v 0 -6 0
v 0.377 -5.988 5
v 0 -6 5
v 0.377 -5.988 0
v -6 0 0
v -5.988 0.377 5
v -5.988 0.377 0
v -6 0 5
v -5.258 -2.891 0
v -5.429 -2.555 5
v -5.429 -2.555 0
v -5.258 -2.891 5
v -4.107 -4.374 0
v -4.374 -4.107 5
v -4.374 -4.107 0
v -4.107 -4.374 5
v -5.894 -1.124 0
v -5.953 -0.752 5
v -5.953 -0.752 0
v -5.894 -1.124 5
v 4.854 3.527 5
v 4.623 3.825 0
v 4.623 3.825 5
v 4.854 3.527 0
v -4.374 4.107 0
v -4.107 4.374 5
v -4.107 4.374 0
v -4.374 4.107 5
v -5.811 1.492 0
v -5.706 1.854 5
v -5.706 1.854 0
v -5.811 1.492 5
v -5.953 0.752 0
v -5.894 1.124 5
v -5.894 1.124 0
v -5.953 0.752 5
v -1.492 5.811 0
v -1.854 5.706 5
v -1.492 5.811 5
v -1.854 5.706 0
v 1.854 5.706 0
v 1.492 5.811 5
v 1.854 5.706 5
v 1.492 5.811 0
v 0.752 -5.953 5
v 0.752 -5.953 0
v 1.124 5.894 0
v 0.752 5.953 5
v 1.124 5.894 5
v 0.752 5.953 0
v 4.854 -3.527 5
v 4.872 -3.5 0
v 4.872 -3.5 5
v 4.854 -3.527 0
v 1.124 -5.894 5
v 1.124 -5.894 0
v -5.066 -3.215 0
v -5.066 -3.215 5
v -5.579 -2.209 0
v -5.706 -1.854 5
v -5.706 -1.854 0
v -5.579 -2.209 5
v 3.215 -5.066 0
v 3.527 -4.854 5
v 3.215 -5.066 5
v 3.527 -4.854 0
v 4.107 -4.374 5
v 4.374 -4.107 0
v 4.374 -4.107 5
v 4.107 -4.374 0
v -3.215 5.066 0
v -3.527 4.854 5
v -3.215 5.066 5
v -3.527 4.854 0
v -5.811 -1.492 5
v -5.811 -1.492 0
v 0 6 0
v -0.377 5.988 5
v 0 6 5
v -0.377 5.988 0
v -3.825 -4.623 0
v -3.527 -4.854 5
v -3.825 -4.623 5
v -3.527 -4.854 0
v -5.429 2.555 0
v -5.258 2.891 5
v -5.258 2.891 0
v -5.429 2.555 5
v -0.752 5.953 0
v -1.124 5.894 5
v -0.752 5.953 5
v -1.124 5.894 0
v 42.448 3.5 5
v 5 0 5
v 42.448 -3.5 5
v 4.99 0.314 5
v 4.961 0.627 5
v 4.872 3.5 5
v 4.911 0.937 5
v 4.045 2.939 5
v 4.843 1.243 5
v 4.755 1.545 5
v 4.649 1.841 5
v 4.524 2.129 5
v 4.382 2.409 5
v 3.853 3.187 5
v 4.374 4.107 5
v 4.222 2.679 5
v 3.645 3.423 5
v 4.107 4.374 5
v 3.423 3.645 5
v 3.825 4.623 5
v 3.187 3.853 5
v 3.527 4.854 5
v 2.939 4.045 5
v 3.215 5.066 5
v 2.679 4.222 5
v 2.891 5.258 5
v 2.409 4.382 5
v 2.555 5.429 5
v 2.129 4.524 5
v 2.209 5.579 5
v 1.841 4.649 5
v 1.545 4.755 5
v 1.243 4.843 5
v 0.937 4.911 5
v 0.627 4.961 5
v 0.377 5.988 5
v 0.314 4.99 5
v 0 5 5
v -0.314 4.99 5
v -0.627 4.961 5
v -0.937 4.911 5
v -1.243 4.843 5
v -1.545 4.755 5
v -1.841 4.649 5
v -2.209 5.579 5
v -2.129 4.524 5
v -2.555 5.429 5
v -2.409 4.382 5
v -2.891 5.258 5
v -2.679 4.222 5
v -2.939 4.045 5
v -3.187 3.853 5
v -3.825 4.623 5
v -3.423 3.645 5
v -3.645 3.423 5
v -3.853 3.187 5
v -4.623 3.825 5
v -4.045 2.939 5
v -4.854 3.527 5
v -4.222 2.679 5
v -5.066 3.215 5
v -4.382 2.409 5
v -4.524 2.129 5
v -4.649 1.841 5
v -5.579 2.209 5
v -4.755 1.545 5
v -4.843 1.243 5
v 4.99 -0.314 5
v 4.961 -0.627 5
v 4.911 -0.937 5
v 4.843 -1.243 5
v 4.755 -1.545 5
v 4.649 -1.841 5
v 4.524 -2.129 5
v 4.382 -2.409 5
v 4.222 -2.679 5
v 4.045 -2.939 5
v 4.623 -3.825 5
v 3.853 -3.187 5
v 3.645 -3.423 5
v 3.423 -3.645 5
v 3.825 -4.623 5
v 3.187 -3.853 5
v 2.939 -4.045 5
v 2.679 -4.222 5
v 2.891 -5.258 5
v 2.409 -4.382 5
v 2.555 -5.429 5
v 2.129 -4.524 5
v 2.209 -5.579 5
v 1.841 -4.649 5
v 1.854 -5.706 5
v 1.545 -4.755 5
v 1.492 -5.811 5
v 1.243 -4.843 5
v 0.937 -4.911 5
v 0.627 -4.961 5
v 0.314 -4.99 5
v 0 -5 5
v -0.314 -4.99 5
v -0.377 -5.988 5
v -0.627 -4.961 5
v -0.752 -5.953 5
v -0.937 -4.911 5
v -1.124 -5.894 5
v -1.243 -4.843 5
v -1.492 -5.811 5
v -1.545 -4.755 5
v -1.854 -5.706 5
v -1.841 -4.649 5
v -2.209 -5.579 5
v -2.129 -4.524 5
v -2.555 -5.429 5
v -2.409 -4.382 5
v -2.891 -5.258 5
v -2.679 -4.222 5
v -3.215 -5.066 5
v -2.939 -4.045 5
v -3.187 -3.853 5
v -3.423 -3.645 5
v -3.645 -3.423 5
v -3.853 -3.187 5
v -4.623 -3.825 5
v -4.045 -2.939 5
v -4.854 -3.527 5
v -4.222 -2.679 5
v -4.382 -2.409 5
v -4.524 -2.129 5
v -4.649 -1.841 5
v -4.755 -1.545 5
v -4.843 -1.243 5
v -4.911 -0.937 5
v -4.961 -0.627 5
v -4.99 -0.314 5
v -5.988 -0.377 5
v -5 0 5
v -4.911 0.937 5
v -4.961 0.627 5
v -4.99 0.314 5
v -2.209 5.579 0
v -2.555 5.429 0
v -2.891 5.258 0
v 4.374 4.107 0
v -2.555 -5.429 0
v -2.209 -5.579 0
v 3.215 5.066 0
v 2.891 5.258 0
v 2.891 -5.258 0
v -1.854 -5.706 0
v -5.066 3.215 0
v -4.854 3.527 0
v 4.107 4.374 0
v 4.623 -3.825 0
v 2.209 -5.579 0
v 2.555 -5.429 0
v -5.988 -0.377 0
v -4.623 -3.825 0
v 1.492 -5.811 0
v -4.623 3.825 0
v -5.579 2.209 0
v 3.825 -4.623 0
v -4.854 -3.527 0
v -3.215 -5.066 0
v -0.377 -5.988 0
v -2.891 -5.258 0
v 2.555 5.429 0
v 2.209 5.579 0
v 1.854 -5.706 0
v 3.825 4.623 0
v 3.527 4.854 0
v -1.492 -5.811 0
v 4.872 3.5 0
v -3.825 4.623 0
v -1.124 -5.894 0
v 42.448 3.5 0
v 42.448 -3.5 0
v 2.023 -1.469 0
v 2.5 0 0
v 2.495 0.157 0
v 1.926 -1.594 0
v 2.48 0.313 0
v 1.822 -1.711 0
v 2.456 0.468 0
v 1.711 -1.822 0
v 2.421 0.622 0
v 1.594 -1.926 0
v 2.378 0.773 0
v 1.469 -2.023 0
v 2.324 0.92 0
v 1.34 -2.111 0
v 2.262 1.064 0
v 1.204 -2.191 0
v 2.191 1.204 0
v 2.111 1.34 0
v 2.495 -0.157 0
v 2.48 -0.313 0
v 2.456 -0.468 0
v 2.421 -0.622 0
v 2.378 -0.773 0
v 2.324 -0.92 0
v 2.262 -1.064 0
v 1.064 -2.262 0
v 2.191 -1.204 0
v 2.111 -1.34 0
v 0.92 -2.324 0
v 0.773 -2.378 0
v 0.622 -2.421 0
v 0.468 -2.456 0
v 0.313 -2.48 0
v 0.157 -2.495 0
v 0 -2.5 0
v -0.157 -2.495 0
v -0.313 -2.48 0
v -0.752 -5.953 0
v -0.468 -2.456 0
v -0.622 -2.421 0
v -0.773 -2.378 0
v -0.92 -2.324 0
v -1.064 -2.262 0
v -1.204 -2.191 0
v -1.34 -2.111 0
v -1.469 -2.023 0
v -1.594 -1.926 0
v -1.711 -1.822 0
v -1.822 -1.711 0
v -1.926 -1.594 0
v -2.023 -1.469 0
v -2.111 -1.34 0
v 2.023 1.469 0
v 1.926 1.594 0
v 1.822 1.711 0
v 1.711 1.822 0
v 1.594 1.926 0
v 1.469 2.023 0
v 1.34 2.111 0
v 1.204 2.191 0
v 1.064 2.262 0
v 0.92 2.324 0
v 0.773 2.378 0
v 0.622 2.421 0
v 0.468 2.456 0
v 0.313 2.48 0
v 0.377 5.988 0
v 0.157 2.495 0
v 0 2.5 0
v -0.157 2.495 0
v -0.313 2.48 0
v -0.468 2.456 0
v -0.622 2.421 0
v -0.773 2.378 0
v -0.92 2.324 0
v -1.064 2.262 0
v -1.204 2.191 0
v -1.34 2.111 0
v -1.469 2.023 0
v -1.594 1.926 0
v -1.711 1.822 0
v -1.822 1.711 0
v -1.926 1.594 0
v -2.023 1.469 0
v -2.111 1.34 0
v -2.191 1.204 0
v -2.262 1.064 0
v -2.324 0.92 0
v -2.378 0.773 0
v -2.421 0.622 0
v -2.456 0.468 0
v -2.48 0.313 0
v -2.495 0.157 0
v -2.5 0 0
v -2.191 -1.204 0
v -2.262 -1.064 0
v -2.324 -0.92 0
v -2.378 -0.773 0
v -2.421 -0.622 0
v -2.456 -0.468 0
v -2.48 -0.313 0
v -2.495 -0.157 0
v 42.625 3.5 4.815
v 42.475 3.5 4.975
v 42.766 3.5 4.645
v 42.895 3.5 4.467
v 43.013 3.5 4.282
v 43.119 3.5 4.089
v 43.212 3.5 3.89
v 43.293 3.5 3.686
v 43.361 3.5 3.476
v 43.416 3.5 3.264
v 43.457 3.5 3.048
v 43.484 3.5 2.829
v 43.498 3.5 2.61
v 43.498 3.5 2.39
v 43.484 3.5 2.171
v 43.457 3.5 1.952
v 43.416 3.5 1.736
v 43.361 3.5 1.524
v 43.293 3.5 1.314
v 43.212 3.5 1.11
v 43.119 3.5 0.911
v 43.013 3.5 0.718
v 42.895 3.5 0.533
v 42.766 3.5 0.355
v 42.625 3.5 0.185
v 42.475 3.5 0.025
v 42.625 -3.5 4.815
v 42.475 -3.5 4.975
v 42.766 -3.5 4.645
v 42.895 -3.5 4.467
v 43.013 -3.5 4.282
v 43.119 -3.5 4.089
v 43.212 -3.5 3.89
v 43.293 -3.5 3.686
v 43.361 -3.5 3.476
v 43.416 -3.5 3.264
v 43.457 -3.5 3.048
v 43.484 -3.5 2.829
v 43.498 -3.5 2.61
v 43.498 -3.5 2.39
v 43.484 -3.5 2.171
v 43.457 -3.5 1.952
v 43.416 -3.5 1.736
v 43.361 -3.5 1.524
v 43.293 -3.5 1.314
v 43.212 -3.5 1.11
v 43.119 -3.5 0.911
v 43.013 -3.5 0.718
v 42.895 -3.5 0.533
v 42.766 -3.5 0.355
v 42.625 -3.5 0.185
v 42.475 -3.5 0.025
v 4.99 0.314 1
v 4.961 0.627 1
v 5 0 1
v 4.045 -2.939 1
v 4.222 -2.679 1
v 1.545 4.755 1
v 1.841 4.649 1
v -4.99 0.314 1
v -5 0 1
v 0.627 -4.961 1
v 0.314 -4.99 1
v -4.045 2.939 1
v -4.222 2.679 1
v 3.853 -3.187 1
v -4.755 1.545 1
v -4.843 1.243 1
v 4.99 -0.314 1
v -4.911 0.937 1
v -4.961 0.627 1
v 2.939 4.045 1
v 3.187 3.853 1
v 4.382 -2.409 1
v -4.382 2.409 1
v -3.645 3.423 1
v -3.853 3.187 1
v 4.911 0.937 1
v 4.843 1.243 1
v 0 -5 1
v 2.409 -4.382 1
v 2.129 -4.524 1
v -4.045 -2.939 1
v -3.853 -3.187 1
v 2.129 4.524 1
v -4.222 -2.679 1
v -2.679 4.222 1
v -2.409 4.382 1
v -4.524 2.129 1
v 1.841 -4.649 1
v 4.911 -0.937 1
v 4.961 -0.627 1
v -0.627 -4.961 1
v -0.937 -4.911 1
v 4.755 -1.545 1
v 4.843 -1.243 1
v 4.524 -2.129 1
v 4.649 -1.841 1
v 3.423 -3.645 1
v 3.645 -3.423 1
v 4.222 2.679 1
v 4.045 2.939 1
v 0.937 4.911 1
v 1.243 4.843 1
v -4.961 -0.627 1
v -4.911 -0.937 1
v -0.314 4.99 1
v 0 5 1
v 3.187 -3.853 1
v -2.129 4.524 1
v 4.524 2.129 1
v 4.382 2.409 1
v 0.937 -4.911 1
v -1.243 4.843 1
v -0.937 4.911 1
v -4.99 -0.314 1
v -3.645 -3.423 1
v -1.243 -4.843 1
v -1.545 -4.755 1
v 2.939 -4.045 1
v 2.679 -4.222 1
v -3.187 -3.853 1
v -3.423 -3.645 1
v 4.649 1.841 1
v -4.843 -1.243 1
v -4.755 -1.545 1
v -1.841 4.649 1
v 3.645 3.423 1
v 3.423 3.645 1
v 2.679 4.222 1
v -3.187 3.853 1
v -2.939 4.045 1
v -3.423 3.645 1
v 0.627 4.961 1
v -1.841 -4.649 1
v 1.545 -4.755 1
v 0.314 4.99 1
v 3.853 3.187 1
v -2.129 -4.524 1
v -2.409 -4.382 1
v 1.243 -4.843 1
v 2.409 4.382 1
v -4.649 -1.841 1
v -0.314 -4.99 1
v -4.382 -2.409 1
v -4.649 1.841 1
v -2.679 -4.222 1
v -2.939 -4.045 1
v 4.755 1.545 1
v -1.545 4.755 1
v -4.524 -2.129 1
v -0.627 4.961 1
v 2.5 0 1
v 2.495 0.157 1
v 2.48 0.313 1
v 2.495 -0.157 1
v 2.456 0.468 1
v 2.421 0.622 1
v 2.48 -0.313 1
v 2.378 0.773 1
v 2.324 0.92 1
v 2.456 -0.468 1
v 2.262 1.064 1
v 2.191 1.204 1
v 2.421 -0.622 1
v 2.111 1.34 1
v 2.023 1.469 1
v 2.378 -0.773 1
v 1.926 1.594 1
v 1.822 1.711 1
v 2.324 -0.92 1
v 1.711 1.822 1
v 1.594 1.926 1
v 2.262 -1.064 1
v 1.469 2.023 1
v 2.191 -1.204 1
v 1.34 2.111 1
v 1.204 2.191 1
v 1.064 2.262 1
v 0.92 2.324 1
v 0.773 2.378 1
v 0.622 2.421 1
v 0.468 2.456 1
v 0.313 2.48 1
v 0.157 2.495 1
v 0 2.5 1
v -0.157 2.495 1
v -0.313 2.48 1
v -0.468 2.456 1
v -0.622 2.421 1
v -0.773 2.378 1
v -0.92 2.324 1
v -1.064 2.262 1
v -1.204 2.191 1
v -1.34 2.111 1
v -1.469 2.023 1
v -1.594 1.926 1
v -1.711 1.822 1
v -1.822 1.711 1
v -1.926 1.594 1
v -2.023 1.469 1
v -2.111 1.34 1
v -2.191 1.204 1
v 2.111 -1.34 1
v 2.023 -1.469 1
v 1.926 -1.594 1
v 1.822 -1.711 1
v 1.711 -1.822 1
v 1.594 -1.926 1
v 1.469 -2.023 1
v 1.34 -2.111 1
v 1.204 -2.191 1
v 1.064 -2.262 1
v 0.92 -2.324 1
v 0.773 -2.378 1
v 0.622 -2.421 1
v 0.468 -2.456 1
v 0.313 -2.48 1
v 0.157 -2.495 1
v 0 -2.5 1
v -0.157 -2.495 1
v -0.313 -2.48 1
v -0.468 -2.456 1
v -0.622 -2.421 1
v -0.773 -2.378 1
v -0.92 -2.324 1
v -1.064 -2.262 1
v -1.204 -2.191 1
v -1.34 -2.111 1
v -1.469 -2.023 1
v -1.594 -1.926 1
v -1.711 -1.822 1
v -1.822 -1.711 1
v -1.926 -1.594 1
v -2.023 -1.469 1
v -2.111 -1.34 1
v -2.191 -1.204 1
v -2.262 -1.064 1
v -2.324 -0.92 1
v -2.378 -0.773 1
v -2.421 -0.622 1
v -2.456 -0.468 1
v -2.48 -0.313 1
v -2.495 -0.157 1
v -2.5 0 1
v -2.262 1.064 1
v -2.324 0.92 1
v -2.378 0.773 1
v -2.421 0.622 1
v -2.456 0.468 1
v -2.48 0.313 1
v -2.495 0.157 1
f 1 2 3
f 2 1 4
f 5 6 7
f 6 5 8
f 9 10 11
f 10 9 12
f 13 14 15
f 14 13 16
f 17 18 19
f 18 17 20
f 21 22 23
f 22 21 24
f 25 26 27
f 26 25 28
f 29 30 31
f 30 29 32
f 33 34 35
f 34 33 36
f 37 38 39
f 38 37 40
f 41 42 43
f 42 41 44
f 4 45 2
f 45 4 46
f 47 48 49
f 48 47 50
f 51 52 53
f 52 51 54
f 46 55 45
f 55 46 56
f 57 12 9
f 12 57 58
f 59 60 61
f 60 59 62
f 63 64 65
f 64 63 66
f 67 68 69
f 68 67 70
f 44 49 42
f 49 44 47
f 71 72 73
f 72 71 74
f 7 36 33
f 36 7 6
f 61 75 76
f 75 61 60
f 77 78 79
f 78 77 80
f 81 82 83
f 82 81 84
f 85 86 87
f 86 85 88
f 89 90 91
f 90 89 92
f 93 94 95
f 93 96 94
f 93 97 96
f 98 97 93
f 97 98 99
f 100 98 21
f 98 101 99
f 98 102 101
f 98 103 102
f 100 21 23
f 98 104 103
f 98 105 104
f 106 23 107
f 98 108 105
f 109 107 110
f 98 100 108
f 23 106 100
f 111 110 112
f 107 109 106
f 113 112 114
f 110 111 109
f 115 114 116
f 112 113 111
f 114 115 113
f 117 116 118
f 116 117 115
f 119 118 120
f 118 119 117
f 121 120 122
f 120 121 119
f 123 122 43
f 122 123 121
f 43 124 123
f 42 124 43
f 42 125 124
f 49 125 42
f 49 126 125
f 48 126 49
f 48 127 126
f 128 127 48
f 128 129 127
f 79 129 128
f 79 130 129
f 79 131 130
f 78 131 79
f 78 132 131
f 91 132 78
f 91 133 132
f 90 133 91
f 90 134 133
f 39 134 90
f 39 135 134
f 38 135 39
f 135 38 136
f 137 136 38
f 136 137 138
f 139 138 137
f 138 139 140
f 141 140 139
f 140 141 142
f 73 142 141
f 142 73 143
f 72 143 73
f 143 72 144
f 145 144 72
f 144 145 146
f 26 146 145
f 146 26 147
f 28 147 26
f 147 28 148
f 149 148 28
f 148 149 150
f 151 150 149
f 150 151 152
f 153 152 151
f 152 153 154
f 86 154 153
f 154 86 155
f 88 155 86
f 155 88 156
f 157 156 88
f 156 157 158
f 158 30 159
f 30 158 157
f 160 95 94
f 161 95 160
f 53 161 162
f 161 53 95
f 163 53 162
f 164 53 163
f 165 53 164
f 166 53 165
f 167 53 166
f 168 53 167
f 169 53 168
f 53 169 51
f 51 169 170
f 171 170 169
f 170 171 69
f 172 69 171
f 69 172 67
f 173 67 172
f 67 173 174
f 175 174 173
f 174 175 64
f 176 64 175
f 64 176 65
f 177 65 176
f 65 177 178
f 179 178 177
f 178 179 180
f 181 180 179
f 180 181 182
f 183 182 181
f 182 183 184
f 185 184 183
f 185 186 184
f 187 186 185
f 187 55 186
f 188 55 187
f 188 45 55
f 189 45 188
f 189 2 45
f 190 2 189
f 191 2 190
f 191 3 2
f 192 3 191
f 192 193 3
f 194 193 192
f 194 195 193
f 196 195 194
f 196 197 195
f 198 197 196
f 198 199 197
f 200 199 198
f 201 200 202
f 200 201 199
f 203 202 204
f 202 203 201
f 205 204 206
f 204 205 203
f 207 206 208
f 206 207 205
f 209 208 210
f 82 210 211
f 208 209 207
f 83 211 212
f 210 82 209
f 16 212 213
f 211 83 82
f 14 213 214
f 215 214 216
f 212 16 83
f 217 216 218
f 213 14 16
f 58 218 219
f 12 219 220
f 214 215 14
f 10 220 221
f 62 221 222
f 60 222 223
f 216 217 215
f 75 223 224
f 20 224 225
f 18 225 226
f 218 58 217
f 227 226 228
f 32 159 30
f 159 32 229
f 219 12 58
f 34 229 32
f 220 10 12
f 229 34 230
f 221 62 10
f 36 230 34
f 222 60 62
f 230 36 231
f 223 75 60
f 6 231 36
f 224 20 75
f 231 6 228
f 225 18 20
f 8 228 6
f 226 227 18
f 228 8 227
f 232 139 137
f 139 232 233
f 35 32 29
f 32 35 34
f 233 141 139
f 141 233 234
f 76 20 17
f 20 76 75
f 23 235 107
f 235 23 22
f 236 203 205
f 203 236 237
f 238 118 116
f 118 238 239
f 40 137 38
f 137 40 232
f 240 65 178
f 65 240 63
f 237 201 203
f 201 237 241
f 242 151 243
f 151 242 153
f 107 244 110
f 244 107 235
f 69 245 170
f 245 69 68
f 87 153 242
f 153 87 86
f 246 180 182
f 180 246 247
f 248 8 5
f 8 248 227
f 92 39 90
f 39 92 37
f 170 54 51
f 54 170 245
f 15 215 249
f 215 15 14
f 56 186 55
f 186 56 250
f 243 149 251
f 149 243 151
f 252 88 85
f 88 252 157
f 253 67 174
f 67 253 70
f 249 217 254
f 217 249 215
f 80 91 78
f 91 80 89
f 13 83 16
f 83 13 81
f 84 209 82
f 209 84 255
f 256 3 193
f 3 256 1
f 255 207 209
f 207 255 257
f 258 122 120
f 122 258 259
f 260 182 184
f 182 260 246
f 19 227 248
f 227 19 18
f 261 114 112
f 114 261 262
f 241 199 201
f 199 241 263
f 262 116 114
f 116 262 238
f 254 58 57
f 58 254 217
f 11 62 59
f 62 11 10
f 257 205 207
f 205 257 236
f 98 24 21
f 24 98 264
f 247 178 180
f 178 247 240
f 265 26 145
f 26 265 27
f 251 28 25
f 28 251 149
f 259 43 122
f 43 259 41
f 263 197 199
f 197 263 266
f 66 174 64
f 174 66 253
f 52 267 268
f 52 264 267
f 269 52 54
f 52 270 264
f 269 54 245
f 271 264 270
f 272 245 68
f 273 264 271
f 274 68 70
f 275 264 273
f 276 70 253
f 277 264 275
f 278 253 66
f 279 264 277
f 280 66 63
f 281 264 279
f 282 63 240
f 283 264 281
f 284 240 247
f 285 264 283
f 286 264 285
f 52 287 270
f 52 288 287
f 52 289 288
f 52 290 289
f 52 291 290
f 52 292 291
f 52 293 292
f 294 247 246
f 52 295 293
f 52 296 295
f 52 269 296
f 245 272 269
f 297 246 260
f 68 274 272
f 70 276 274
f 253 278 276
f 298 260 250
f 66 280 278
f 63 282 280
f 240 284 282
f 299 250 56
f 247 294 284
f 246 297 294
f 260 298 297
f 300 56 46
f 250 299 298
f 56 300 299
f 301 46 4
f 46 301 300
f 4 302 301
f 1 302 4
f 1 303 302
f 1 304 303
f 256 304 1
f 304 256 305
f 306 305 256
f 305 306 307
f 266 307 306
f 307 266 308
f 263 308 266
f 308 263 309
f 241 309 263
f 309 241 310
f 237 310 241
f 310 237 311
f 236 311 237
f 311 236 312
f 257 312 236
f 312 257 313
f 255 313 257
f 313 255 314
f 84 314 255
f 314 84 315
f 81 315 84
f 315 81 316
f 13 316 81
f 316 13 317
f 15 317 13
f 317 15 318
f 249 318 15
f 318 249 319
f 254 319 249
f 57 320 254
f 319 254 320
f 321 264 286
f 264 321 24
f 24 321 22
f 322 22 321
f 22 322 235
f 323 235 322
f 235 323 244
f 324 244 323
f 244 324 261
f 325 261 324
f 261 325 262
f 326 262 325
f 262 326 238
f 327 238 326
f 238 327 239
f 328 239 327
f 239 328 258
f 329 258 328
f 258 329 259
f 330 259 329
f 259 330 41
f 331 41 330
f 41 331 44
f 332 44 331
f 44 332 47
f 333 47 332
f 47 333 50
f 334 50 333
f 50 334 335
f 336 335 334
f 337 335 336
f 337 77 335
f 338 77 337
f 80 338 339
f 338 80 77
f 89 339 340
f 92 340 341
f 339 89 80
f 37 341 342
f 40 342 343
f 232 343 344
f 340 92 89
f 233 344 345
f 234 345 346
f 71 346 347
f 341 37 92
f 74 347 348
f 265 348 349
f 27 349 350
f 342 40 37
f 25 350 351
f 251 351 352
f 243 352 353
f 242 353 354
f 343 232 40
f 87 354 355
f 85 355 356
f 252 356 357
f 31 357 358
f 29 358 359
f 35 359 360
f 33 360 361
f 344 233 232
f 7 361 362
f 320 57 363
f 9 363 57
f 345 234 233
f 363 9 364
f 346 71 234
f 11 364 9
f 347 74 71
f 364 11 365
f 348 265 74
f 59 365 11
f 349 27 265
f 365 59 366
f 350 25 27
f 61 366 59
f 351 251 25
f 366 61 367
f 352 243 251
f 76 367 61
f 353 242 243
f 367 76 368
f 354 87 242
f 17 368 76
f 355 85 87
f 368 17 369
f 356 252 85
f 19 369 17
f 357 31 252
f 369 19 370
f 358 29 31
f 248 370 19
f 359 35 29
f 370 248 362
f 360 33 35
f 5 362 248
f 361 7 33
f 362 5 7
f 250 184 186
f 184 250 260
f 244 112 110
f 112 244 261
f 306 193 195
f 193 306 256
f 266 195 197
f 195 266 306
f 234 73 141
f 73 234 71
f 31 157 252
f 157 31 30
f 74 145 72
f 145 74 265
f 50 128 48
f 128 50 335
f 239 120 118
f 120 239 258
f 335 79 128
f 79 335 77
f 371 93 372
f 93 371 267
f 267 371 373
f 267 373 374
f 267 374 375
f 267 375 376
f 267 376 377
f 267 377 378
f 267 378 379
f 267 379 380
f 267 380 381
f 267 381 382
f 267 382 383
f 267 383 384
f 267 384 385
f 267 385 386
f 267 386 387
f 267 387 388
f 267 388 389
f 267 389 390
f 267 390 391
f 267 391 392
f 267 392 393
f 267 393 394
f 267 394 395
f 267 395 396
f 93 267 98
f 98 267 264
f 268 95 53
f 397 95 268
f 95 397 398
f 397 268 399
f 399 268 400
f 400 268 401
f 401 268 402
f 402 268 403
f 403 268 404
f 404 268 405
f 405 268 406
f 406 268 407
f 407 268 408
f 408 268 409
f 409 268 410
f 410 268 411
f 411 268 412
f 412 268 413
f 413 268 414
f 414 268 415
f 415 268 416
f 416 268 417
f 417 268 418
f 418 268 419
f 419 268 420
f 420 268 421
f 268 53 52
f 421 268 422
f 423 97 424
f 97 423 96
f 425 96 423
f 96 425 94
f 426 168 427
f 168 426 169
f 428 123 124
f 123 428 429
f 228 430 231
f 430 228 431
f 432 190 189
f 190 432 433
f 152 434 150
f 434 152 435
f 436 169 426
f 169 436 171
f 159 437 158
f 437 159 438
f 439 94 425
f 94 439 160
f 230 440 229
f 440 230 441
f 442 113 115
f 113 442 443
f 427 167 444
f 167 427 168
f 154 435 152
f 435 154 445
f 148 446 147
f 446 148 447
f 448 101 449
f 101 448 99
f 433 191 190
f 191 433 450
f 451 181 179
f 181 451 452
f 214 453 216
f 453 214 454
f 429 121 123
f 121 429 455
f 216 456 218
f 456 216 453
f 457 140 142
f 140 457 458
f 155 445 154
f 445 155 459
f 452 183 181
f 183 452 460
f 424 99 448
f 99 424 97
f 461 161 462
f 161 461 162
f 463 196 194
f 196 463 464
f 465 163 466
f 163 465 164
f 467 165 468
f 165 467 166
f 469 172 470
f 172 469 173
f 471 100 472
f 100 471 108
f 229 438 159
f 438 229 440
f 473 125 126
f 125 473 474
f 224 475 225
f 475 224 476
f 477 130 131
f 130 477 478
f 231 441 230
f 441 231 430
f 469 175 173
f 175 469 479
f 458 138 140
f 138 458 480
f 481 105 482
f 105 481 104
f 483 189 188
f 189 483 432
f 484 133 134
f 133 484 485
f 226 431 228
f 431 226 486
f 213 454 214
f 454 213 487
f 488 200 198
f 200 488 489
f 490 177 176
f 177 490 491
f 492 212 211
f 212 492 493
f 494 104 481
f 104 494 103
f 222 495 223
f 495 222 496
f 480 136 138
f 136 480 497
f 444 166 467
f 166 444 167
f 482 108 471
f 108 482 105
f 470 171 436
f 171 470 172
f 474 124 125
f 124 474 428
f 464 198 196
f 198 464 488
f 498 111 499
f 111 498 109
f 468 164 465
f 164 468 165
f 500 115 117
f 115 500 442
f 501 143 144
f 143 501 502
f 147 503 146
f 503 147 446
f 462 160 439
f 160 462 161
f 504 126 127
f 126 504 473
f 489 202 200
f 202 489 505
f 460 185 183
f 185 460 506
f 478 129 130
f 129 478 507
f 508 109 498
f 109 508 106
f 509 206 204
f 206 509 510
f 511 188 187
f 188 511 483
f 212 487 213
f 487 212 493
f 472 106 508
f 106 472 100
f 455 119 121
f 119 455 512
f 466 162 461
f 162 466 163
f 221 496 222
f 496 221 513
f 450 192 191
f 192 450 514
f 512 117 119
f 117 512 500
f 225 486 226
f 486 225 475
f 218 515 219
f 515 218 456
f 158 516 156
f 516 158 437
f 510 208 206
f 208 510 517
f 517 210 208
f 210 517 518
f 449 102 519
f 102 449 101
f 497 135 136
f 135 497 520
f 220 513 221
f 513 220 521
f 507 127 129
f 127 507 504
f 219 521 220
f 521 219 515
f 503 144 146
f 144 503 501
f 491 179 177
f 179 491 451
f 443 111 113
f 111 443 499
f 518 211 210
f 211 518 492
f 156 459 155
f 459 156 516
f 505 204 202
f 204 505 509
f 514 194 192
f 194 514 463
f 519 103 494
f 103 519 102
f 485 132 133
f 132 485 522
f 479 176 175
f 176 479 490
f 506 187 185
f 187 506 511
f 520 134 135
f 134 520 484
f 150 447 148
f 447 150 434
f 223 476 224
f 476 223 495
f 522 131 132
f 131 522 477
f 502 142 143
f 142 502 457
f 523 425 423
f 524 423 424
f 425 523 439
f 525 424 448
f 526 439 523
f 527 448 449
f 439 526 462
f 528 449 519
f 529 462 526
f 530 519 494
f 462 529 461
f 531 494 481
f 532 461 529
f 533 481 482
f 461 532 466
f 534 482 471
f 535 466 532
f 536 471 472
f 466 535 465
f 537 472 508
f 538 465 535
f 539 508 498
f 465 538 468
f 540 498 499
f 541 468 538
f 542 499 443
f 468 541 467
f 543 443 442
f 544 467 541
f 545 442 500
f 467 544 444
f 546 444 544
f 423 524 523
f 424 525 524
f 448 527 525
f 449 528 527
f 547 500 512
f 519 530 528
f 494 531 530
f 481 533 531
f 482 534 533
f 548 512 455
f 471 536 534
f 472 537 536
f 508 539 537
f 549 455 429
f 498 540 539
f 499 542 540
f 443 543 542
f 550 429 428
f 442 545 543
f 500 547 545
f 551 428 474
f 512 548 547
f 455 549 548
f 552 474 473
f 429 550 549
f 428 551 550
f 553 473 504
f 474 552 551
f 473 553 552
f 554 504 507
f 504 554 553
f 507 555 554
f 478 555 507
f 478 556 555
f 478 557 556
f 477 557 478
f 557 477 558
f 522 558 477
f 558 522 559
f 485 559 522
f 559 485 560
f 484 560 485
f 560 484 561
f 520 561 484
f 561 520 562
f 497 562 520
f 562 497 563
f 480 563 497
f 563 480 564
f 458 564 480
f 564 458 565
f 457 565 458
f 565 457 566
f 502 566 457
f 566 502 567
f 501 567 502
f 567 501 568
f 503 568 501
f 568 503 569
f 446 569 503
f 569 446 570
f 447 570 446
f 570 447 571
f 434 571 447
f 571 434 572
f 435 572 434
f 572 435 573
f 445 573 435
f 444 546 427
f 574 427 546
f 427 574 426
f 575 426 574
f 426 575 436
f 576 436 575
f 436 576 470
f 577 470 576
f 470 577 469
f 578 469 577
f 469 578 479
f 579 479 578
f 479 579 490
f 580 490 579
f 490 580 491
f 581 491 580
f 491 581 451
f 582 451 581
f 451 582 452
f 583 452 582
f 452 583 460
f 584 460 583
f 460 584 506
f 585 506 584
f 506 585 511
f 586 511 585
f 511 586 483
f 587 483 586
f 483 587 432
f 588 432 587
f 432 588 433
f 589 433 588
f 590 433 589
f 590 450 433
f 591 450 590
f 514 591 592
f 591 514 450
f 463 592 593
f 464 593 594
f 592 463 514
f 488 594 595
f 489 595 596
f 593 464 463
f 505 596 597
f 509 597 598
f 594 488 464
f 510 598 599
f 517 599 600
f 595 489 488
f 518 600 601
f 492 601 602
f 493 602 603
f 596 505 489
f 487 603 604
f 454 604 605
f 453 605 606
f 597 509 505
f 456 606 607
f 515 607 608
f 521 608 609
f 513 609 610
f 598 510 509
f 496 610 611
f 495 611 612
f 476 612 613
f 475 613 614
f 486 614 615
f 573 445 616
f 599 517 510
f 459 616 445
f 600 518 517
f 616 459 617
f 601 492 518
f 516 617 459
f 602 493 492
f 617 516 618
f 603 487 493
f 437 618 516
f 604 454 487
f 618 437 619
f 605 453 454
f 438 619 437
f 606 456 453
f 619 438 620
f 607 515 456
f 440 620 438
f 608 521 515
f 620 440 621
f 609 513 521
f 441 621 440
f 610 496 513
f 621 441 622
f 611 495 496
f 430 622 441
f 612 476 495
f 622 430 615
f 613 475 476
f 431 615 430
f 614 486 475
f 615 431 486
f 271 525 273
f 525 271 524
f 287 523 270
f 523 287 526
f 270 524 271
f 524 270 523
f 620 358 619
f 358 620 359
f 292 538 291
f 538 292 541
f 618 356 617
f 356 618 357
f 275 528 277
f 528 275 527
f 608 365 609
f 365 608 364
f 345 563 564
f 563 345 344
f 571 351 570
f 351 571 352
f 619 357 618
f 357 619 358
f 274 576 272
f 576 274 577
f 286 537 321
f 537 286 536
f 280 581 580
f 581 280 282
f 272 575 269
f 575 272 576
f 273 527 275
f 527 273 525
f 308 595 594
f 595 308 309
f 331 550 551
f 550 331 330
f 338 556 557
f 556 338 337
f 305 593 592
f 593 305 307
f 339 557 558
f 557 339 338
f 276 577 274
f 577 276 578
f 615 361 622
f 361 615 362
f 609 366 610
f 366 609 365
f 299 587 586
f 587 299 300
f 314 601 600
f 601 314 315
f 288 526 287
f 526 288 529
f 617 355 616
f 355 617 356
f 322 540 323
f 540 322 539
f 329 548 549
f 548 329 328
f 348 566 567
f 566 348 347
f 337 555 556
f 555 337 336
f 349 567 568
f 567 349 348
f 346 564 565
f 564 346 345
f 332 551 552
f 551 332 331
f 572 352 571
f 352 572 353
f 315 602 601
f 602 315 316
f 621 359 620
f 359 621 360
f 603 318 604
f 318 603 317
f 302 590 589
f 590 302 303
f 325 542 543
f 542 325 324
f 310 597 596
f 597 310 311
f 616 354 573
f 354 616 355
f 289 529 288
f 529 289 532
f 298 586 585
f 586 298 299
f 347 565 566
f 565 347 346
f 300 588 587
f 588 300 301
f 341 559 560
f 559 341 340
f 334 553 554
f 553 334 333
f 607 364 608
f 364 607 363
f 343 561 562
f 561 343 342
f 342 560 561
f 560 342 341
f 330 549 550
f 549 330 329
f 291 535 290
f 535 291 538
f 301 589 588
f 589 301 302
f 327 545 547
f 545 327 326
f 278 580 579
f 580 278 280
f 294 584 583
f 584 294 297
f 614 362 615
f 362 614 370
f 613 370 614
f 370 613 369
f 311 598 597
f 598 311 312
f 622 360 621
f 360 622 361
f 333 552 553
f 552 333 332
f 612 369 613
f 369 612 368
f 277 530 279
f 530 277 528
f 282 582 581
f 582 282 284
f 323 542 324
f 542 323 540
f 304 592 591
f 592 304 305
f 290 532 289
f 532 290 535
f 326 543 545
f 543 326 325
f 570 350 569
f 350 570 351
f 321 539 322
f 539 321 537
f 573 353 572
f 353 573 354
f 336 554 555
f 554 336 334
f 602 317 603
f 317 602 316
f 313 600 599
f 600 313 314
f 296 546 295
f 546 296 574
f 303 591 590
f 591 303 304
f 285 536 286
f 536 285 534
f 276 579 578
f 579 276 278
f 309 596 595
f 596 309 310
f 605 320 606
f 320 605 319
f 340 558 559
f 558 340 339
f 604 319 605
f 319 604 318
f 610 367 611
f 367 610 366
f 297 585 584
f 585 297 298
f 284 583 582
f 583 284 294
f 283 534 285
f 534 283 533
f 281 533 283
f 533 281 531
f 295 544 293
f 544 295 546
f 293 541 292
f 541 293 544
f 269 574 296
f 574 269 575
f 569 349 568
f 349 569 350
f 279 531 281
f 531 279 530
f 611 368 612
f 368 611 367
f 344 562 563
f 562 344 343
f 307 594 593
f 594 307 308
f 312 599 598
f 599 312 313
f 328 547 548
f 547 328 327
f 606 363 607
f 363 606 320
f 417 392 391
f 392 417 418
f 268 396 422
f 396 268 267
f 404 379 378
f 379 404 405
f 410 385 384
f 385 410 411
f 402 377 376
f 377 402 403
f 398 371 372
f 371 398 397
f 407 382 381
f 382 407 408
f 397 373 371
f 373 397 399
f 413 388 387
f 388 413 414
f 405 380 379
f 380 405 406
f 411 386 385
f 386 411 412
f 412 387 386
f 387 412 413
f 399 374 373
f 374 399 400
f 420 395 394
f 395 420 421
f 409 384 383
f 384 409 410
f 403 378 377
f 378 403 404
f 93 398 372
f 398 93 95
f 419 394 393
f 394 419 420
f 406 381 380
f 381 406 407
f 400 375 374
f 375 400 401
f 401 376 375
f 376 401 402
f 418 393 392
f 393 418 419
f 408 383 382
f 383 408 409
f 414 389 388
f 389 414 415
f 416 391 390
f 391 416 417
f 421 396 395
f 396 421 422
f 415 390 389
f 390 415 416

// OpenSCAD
// inspired by:
// https://www.thingiverse.com/thing:4688862

$fn = 100;

leglen = 40;
legwid = 7;
legthick = 5;

module screw_hole() {
  translate([0, 0, 1]) linear_extrude(height=legthick) circle(r=5);
  translate([0, 0, -1]) linear_extrude(height=legthick) circle(r=2.5);
}

module leg() {
  linear_extrude(height=legthick) circle(r=6);
  linear_extrude(height=legthick) translate([leglen / 2, 0, 0]) square(size=[leglen, legwid], center=true);
}

module foot_sphere() {
  sphere(r=legthick * 0.7);
}

module foot() {
  footwid = legwid;
  intersection() {
    hull() {
      translate([0, -footwid / 2, 0]) foot_sphere();
      translate([0, footwid / 2, 0]) foot_sphere();
    }
    cube([legthick * 2, footwid, legthick], center=true);
  }
}

difference() {
  leg();
  screw_hole();
}
translate([leglen, 0, legthick / 2]) foot();
